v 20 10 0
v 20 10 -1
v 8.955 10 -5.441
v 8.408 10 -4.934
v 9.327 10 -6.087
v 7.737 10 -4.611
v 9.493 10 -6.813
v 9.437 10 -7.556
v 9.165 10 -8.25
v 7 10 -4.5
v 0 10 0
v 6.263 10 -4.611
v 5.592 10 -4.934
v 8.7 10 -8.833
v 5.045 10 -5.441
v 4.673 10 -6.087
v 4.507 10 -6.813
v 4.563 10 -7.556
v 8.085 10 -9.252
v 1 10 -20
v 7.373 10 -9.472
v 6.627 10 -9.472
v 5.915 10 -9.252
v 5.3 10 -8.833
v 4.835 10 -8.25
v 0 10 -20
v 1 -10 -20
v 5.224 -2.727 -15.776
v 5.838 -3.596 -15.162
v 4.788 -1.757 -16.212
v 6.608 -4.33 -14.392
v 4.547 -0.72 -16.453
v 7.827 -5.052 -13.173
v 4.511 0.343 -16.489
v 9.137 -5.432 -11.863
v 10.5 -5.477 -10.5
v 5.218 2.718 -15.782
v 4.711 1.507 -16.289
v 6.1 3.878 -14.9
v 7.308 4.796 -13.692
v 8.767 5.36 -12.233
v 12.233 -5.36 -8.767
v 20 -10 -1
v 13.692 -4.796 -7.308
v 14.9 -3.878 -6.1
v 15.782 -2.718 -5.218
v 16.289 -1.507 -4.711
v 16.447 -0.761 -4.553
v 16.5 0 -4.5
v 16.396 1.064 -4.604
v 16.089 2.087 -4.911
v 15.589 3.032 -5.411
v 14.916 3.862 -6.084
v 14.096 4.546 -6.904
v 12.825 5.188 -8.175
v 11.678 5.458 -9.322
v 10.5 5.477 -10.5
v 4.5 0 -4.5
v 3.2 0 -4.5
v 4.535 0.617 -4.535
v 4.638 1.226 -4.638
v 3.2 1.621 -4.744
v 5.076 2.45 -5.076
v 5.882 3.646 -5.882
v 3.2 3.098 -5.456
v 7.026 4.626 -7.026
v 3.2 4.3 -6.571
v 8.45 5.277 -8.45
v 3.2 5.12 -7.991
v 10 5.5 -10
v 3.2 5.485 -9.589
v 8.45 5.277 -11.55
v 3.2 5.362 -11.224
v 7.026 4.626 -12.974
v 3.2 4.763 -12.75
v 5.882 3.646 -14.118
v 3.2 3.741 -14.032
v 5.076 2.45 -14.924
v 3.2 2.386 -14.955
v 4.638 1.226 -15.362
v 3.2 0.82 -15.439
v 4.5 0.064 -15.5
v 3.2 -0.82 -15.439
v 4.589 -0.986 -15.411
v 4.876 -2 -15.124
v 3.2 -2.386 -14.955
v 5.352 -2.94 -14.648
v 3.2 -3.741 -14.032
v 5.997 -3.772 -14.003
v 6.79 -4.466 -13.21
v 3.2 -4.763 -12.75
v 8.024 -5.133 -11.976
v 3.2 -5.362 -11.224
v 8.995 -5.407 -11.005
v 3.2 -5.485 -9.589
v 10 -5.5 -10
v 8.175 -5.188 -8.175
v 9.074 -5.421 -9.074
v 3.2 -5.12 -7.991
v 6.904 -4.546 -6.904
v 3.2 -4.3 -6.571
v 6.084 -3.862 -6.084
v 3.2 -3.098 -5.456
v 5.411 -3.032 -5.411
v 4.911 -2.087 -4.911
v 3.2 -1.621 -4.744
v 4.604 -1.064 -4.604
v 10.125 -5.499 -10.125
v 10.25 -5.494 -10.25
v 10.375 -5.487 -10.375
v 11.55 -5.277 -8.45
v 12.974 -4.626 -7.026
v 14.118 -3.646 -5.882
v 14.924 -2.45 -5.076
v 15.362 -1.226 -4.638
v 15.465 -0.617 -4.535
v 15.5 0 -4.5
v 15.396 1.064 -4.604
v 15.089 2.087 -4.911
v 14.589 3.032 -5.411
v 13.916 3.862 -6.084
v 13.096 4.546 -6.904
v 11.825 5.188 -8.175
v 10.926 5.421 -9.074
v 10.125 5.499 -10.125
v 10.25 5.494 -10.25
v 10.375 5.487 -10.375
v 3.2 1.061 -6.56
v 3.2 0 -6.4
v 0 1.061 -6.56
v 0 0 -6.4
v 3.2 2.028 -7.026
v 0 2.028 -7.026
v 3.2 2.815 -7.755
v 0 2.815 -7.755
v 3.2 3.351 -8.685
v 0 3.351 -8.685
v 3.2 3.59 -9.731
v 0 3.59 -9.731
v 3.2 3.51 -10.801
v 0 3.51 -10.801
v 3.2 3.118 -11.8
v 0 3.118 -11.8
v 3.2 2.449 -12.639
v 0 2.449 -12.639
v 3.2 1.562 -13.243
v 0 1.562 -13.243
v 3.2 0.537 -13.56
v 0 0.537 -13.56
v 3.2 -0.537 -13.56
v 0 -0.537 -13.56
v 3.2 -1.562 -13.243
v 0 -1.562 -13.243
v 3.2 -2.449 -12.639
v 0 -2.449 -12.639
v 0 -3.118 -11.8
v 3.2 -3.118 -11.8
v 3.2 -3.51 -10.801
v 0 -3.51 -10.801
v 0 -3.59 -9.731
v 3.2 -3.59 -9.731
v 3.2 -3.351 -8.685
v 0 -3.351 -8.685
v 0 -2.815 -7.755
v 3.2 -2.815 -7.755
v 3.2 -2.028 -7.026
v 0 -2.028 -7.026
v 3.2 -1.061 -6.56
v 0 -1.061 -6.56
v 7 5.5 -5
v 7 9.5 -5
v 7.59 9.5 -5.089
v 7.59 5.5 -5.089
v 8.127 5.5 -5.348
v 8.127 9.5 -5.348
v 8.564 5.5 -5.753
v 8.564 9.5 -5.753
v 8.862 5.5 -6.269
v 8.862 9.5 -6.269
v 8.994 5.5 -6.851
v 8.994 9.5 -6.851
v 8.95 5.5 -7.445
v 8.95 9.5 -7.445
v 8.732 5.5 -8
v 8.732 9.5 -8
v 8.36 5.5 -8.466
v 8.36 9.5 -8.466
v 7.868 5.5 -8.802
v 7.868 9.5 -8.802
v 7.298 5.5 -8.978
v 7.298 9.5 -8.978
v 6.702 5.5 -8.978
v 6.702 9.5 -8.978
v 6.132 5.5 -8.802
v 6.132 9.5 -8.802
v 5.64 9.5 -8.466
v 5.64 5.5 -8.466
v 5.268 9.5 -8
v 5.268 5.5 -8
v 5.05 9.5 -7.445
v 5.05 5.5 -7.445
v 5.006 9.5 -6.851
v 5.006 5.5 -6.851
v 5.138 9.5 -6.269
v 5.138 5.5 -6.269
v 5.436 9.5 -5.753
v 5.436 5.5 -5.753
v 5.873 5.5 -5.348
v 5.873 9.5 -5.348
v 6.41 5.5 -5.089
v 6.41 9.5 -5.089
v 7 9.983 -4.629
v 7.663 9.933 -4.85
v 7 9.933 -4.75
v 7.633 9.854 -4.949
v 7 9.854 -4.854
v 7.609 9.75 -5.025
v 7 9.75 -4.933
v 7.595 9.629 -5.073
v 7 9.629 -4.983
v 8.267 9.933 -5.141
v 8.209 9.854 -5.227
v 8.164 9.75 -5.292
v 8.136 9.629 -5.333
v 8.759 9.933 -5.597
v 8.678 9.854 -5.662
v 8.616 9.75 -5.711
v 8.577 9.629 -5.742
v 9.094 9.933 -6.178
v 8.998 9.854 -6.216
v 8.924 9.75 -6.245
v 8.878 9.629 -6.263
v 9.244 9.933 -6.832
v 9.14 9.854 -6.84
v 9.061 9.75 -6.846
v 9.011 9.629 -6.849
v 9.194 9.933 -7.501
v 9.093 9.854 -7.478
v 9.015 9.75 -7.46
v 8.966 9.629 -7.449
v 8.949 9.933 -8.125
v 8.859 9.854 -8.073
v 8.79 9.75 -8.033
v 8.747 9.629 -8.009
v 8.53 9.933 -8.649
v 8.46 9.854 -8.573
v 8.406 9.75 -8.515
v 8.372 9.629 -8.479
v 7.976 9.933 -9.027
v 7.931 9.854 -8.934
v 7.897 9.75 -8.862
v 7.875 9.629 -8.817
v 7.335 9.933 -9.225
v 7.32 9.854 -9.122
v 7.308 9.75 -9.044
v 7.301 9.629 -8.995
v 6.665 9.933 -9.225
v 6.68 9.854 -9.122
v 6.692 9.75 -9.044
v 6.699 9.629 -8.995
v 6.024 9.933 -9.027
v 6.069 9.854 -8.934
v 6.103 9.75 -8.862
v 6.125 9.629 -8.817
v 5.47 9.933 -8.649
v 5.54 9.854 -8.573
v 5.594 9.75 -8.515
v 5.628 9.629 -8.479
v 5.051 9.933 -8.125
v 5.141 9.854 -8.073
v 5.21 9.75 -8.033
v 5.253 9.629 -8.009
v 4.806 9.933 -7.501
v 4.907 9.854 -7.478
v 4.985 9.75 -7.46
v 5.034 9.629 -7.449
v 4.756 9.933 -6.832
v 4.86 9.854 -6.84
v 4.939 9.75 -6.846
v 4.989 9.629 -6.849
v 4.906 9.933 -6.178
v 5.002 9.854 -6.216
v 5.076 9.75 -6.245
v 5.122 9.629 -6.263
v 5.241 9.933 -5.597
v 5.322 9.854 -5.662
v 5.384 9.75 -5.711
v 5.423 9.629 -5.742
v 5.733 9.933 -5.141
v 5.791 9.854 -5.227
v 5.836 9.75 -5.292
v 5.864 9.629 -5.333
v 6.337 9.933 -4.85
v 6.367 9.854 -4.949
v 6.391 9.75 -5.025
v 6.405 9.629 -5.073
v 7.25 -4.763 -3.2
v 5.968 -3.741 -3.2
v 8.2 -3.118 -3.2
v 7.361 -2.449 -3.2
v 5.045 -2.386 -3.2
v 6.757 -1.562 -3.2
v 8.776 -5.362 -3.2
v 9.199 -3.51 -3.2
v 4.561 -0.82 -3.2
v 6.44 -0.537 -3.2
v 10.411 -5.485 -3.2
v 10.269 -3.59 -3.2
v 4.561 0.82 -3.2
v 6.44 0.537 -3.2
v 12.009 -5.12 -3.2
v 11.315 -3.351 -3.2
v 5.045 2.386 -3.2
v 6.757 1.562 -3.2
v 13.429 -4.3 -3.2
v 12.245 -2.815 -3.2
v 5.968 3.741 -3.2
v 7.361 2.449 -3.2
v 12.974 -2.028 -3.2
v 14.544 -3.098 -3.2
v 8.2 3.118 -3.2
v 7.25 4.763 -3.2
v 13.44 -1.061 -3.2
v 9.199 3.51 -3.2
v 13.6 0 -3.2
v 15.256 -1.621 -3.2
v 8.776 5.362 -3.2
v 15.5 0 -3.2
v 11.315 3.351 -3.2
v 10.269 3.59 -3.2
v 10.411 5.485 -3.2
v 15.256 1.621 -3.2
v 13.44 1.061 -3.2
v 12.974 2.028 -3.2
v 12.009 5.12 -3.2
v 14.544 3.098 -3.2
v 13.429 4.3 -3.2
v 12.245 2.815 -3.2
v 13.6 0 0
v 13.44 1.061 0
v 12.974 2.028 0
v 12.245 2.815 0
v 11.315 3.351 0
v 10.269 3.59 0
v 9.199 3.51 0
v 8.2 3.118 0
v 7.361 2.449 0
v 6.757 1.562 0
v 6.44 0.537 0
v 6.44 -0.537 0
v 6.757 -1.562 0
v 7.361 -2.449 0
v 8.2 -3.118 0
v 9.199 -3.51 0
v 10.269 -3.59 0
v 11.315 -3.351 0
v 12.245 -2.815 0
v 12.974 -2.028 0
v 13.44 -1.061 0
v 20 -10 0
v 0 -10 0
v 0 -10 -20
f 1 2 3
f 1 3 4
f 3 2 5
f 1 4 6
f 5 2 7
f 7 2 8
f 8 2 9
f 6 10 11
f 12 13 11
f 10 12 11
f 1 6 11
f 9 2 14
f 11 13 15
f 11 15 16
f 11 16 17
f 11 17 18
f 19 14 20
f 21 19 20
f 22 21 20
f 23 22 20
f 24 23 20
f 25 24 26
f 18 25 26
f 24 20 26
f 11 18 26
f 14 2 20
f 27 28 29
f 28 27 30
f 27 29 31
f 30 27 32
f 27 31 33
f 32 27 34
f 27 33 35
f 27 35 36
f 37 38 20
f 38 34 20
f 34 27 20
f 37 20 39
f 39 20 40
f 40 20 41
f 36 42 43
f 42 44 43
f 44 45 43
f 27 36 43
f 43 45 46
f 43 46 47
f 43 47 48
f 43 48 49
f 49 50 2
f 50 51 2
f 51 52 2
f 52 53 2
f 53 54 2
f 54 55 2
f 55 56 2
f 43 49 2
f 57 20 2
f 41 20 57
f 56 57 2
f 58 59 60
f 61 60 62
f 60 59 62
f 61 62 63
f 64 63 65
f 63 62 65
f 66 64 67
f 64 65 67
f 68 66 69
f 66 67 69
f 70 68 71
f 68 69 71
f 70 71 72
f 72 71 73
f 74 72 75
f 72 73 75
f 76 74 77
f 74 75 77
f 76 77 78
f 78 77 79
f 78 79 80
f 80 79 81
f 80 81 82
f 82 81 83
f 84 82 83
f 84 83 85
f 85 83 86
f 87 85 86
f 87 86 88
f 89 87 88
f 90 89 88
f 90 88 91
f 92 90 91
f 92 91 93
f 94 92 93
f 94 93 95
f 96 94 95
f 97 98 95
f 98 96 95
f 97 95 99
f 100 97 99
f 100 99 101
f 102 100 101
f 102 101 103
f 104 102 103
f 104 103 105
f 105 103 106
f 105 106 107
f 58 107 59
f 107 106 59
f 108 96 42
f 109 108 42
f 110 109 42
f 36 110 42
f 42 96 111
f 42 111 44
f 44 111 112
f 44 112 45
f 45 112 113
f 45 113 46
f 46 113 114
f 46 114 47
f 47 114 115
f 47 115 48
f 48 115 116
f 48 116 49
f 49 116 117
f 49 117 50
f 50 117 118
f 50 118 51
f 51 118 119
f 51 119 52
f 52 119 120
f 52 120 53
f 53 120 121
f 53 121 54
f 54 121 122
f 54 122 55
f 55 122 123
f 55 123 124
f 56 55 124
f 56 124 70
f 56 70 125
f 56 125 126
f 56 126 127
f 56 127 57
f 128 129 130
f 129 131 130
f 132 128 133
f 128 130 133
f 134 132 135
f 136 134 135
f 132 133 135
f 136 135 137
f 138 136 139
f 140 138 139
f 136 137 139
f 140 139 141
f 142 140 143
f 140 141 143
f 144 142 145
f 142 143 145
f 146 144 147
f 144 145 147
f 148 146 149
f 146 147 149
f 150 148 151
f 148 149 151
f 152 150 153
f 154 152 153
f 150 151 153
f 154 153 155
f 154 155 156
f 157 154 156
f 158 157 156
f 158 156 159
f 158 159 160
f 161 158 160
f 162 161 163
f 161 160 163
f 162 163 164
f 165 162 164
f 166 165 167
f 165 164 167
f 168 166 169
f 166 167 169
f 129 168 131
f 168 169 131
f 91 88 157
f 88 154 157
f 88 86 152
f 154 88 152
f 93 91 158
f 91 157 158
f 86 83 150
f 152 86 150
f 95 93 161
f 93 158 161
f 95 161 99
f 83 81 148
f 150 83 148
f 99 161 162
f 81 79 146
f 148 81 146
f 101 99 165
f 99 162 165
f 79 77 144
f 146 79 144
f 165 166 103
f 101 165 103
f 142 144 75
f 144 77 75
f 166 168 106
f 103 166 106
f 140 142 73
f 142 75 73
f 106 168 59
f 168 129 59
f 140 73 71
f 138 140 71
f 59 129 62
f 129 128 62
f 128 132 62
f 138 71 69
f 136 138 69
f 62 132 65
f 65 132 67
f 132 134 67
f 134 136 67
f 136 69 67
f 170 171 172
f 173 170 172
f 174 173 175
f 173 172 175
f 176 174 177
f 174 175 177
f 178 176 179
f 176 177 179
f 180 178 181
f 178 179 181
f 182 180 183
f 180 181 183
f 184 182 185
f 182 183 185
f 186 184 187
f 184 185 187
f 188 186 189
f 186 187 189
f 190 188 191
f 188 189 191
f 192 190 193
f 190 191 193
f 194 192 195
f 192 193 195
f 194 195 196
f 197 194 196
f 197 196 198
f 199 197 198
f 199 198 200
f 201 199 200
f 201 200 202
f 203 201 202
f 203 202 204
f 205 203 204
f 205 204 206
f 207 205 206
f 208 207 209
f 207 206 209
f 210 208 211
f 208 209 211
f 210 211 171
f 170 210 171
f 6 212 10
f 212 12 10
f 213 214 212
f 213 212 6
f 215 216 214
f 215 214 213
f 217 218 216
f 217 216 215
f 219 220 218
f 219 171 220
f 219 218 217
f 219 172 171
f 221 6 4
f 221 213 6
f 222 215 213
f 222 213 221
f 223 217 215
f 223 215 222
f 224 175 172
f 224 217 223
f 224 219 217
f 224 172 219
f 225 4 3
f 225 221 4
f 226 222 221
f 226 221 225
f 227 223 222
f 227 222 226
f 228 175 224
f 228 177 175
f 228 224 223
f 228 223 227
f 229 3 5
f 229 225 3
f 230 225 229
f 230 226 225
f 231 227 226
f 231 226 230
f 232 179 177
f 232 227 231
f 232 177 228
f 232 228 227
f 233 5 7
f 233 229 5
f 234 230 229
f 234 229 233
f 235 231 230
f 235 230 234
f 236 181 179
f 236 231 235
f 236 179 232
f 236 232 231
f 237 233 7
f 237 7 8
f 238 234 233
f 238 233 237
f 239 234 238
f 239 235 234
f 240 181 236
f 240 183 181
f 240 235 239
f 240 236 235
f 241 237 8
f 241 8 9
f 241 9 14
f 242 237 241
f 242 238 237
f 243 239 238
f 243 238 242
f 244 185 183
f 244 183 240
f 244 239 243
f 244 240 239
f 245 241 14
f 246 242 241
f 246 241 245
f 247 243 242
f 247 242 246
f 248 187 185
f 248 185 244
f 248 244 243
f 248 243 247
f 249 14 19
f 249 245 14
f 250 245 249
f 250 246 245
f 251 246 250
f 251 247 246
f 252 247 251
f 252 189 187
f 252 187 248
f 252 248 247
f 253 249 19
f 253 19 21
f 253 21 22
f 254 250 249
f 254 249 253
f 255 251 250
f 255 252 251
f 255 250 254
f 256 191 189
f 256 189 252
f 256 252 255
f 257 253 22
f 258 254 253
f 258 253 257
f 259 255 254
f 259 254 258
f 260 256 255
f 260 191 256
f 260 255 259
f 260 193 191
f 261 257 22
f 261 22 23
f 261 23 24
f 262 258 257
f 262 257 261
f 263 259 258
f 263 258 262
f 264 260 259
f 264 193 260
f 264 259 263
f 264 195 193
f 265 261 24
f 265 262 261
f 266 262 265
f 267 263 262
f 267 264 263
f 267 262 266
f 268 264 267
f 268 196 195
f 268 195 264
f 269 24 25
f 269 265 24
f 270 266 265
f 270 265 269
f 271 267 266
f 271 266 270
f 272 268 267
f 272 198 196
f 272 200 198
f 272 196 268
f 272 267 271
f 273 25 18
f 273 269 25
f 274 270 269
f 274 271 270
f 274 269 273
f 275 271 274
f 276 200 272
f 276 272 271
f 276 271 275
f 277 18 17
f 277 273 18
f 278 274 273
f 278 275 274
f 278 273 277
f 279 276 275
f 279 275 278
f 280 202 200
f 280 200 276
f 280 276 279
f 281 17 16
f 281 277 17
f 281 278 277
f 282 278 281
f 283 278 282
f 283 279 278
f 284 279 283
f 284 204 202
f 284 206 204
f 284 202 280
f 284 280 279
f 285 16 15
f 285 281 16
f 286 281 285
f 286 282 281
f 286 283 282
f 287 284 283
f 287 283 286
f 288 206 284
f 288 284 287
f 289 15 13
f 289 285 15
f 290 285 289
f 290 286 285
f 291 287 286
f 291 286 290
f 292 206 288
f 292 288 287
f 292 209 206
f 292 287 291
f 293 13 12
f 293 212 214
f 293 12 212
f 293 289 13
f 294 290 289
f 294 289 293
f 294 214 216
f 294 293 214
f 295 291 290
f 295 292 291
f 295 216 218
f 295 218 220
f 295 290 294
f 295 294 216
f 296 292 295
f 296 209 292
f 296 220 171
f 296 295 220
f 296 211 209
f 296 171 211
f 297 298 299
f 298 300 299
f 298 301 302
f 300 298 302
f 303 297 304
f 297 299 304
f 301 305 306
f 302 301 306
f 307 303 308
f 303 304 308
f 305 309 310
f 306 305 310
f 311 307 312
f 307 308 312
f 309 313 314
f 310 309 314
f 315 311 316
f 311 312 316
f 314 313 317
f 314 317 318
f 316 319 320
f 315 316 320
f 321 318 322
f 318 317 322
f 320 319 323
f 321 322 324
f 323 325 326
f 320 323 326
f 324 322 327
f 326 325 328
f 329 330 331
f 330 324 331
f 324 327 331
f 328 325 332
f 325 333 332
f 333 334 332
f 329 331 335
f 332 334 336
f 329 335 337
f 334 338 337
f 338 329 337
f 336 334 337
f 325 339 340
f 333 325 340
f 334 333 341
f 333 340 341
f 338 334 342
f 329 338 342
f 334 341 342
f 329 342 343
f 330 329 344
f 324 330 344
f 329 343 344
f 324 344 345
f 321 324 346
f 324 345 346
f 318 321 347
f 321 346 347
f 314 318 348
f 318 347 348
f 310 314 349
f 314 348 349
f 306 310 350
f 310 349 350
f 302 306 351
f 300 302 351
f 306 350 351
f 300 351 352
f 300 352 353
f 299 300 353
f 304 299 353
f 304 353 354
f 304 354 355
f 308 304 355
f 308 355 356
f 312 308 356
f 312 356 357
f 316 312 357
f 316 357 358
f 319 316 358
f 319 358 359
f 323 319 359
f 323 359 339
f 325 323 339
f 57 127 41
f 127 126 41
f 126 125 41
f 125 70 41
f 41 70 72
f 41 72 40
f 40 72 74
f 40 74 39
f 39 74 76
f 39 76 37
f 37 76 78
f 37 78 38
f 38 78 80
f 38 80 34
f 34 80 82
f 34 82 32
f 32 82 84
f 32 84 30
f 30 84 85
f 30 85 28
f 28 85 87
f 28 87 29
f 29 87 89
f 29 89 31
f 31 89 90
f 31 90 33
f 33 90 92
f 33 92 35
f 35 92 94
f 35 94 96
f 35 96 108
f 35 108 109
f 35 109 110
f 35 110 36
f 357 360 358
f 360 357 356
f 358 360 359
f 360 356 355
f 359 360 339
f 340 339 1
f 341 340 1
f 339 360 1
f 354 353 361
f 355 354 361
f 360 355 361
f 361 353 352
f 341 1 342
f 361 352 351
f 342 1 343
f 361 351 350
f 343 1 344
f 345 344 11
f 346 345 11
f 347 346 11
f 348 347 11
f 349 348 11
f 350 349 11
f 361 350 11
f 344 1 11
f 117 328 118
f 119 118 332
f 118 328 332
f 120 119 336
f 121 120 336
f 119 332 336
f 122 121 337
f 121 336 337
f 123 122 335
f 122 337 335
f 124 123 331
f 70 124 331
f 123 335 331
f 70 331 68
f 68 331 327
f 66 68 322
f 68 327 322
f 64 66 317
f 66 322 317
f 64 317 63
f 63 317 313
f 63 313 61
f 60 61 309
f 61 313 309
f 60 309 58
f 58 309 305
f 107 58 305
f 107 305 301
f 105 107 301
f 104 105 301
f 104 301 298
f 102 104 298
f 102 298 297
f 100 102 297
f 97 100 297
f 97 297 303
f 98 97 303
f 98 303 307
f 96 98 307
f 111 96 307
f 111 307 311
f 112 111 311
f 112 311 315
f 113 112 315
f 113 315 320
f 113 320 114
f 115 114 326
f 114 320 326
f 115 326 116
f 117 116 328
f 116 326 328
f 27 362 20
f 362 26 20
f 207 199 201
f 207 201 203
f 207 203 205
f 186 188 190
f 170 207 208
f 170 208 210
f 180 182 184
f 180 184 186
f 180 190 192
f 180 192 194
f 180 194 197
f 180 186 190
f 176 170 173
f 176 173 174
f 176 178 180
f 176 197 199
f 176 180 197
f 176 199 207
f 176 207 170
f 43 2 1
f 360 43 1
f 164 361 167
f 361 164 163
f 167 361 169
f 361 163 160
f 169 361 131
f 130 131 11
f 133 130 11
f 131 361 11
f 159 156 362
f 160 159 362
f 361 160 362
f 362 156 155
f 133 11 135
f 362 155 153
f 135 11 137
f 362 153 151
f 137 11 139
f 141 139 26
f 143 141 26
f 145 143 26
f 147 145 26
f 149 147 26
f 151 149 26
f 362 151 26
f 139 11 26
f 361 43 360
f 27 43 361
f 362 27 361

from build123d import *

# Parameters (mm, degrees)
BOSS_EXTRUDE1_DEPTH = 10
CUT_EXTRUDE1_REACH  = 32
SKETCH3_R           = 3.6
CUT_EXTRUDE3_REACH  = 39.344
CUT_EXTRUDE3_START  = -3.2
SKETCH3_4_R         = 5.5
SKETCH3_4_R_2       = 3.6
CUT_EXTRUDE2_REACH  = 32
SKETCH4_R           = 3.6
CUT_EXTRUDE4_REACH  = 35.2
CUT_EXTRUDE4_START  = -3.2
SKETCH4_3_R         = 5.5
SKETCH4_3_R_2       = 3.6
SKETCH5_R           = 2
CUT_EXTRUDE5_DEPTH  = 4.5
FILLET1_R           = 0.5


with BuildPart() as part:
    # Sketch2 → Boss-Extrude1 (new, symmetric)
    with BuildSketch(Plane(origin=(0, 0, 0), x_dir=(1, 0, 0), z_dir=(0, 1, 0))):
        Polygon((0, 0), (0, 20), (1, 20), (20, 1), (20, 0), align=None)
    extrude(amount=BOSS_EXTRUDE1_DEPTH, both=True)

    # Cut-Extrude1: up to this plane
    cut_extrude1_end = Plane(origin=(1, 10, -20), z_dir=(-0.7071067811865476, 0, 0.7071067811865476))
    # Sketch3 → Cut-Extrude1 (cut, up to the surface)
    with BuildSketch(Plane.XY, mode=Mode.PRIVATE) as cut_extrude1_sk1:
        with Locations((10, 0)):
            Circle(SKETCH3_R)
    cut_extrude1_tool1 = split(extrude(cut_extrude1_sk1.sketch, amount=-CUT_EXTRUDE1_REACH, mode=Mode.PRIVATE), bisect_by=cut_extrude1_end, keep=Keep.BOTH, mode=Mode.PRIVATE)
    add(cut_extrude1_tool1.solids().sort_by_distance((10, 0, 0))[0], mode=Mode.SUBTRACT)

    # Cut-Extrude3: up to this plane
    cut_extrude3_end = Plane(origin=(1, 10, -20), z_dir=(-0.7071067811865476, 0, 0.7071067811865476))
    # Sketch3<4> → Cut-Extrude3 (cut, up to the surface)
    with BuildSketch(Plane.XY.offset(CUT_EXTRUDE3_START), mode=Mode.PRIVATE) as cut_extrude3_sk1:
        with Locations((10, 0)):
            Circle(SKETCH3_4_R)
        with Locations((10, 0)):
            Circle(SKETCH3_4_R_2, mode=Mode.SUBTRACT)
    cut_extrude3_tool1 = split(extrude(cut_extrude3_sk1.sketch, amount=-CUT_EXTRUDE3_REACH, mode=Mode.PRIVATE), bisect_by=cut_extrude3_end, keep=Keep.BOTH, mode=Mode.PRIVATE)
    add(cut_extrude3_tool1.solids().sort_by_distance((4.655563, 0, -3.2))[0], mode=Mode.SUBTRACT)

    # Cut-Extrude2: up to this plane
    cut_extrude2_end = Plane(origin=(1, 10, -20), z_dir=(-0.7071067811865476, 0, 0.7071067811865476))
    # Sketch4 → Cut-Extrude2 (cut, up to the surface)
    with BuildSketch(Plane.ZY, mode=Mode.PRIVATE) as cut_extrude2_sk1:
        with Locations((-10, 0)):
            Circle(SKETCH4_R)
    cut_extrude2_tool1 = split(extrude(cut_extrude2_sk1.sketch, amount=-CUT_EXTRUDE2_REACH, mode=Mode.PRIVATE), bisect_by=cut_extrude2_end, keep=Keep.BOTH, mode=Mode.PRIVATE)
    add(cut_extrude2_tool1.solids().sort_by_distance((0, 0, -10))[0], mode=Mode.SUBTRACT)

    # Cut-Extrude4: up to this plane
    cut_extrude4_end = Plane(origin=(1, 10, -20), z_dir=(-0.7071067811865476, 0, 0.7071067811865476))
    # Sketch4<3> → Cut-Extrude4 (cut, up to the surface)
    with BuildSketch(Plane.ZY.offset(CUT_EXTRUDE4_START), mode=Mode.PRIVATE) as cut_extrude4_sk1:
        with Locations((-10, 0)):
            Circle(SKETCH4_3_R)
        with Locations((-10, 0)):
            Circle(SKETCH4_3_R_2, mode=Mode.SUBTRACT)
    cut_extrude4_tool1 = split(extrude(cut_extrude4_sk1.sketch, amount=-CUT_EXTRUDE4_REACH, mode=Mode.PRIVATE), bisect_by=cut_extrude4_end, keep=Keep.BOTH, mode=Mode.PRIVATE)
    add(cut_extrude4_tool1.solids().sort_by_distance((3.2, 0, -15.344437))[0], mode=Mode.SUBTRACT)

    # Sketch5 → Cut-Extrude5 (cut)
    with BuildSketch(Plane(origin=(0, 10, 0), x_dir=(1, 0, 0), z_dir=(0, 1, 0))):
        with Locations((7, 7)):
            Circle(SKETCH5_R)
    extrude(amount=-CUT_EXTRUDE5_DEPTH, mode=Mode.SUBTRACT)

    # Fillet1
    fillet1_edges = [part.edges().sort_by_distance(p)[0] for p in [
        (5, 10, -7),
    ]]
    fillet(fillet1_edges, radius=FILLET1_R)


solid = part.part
